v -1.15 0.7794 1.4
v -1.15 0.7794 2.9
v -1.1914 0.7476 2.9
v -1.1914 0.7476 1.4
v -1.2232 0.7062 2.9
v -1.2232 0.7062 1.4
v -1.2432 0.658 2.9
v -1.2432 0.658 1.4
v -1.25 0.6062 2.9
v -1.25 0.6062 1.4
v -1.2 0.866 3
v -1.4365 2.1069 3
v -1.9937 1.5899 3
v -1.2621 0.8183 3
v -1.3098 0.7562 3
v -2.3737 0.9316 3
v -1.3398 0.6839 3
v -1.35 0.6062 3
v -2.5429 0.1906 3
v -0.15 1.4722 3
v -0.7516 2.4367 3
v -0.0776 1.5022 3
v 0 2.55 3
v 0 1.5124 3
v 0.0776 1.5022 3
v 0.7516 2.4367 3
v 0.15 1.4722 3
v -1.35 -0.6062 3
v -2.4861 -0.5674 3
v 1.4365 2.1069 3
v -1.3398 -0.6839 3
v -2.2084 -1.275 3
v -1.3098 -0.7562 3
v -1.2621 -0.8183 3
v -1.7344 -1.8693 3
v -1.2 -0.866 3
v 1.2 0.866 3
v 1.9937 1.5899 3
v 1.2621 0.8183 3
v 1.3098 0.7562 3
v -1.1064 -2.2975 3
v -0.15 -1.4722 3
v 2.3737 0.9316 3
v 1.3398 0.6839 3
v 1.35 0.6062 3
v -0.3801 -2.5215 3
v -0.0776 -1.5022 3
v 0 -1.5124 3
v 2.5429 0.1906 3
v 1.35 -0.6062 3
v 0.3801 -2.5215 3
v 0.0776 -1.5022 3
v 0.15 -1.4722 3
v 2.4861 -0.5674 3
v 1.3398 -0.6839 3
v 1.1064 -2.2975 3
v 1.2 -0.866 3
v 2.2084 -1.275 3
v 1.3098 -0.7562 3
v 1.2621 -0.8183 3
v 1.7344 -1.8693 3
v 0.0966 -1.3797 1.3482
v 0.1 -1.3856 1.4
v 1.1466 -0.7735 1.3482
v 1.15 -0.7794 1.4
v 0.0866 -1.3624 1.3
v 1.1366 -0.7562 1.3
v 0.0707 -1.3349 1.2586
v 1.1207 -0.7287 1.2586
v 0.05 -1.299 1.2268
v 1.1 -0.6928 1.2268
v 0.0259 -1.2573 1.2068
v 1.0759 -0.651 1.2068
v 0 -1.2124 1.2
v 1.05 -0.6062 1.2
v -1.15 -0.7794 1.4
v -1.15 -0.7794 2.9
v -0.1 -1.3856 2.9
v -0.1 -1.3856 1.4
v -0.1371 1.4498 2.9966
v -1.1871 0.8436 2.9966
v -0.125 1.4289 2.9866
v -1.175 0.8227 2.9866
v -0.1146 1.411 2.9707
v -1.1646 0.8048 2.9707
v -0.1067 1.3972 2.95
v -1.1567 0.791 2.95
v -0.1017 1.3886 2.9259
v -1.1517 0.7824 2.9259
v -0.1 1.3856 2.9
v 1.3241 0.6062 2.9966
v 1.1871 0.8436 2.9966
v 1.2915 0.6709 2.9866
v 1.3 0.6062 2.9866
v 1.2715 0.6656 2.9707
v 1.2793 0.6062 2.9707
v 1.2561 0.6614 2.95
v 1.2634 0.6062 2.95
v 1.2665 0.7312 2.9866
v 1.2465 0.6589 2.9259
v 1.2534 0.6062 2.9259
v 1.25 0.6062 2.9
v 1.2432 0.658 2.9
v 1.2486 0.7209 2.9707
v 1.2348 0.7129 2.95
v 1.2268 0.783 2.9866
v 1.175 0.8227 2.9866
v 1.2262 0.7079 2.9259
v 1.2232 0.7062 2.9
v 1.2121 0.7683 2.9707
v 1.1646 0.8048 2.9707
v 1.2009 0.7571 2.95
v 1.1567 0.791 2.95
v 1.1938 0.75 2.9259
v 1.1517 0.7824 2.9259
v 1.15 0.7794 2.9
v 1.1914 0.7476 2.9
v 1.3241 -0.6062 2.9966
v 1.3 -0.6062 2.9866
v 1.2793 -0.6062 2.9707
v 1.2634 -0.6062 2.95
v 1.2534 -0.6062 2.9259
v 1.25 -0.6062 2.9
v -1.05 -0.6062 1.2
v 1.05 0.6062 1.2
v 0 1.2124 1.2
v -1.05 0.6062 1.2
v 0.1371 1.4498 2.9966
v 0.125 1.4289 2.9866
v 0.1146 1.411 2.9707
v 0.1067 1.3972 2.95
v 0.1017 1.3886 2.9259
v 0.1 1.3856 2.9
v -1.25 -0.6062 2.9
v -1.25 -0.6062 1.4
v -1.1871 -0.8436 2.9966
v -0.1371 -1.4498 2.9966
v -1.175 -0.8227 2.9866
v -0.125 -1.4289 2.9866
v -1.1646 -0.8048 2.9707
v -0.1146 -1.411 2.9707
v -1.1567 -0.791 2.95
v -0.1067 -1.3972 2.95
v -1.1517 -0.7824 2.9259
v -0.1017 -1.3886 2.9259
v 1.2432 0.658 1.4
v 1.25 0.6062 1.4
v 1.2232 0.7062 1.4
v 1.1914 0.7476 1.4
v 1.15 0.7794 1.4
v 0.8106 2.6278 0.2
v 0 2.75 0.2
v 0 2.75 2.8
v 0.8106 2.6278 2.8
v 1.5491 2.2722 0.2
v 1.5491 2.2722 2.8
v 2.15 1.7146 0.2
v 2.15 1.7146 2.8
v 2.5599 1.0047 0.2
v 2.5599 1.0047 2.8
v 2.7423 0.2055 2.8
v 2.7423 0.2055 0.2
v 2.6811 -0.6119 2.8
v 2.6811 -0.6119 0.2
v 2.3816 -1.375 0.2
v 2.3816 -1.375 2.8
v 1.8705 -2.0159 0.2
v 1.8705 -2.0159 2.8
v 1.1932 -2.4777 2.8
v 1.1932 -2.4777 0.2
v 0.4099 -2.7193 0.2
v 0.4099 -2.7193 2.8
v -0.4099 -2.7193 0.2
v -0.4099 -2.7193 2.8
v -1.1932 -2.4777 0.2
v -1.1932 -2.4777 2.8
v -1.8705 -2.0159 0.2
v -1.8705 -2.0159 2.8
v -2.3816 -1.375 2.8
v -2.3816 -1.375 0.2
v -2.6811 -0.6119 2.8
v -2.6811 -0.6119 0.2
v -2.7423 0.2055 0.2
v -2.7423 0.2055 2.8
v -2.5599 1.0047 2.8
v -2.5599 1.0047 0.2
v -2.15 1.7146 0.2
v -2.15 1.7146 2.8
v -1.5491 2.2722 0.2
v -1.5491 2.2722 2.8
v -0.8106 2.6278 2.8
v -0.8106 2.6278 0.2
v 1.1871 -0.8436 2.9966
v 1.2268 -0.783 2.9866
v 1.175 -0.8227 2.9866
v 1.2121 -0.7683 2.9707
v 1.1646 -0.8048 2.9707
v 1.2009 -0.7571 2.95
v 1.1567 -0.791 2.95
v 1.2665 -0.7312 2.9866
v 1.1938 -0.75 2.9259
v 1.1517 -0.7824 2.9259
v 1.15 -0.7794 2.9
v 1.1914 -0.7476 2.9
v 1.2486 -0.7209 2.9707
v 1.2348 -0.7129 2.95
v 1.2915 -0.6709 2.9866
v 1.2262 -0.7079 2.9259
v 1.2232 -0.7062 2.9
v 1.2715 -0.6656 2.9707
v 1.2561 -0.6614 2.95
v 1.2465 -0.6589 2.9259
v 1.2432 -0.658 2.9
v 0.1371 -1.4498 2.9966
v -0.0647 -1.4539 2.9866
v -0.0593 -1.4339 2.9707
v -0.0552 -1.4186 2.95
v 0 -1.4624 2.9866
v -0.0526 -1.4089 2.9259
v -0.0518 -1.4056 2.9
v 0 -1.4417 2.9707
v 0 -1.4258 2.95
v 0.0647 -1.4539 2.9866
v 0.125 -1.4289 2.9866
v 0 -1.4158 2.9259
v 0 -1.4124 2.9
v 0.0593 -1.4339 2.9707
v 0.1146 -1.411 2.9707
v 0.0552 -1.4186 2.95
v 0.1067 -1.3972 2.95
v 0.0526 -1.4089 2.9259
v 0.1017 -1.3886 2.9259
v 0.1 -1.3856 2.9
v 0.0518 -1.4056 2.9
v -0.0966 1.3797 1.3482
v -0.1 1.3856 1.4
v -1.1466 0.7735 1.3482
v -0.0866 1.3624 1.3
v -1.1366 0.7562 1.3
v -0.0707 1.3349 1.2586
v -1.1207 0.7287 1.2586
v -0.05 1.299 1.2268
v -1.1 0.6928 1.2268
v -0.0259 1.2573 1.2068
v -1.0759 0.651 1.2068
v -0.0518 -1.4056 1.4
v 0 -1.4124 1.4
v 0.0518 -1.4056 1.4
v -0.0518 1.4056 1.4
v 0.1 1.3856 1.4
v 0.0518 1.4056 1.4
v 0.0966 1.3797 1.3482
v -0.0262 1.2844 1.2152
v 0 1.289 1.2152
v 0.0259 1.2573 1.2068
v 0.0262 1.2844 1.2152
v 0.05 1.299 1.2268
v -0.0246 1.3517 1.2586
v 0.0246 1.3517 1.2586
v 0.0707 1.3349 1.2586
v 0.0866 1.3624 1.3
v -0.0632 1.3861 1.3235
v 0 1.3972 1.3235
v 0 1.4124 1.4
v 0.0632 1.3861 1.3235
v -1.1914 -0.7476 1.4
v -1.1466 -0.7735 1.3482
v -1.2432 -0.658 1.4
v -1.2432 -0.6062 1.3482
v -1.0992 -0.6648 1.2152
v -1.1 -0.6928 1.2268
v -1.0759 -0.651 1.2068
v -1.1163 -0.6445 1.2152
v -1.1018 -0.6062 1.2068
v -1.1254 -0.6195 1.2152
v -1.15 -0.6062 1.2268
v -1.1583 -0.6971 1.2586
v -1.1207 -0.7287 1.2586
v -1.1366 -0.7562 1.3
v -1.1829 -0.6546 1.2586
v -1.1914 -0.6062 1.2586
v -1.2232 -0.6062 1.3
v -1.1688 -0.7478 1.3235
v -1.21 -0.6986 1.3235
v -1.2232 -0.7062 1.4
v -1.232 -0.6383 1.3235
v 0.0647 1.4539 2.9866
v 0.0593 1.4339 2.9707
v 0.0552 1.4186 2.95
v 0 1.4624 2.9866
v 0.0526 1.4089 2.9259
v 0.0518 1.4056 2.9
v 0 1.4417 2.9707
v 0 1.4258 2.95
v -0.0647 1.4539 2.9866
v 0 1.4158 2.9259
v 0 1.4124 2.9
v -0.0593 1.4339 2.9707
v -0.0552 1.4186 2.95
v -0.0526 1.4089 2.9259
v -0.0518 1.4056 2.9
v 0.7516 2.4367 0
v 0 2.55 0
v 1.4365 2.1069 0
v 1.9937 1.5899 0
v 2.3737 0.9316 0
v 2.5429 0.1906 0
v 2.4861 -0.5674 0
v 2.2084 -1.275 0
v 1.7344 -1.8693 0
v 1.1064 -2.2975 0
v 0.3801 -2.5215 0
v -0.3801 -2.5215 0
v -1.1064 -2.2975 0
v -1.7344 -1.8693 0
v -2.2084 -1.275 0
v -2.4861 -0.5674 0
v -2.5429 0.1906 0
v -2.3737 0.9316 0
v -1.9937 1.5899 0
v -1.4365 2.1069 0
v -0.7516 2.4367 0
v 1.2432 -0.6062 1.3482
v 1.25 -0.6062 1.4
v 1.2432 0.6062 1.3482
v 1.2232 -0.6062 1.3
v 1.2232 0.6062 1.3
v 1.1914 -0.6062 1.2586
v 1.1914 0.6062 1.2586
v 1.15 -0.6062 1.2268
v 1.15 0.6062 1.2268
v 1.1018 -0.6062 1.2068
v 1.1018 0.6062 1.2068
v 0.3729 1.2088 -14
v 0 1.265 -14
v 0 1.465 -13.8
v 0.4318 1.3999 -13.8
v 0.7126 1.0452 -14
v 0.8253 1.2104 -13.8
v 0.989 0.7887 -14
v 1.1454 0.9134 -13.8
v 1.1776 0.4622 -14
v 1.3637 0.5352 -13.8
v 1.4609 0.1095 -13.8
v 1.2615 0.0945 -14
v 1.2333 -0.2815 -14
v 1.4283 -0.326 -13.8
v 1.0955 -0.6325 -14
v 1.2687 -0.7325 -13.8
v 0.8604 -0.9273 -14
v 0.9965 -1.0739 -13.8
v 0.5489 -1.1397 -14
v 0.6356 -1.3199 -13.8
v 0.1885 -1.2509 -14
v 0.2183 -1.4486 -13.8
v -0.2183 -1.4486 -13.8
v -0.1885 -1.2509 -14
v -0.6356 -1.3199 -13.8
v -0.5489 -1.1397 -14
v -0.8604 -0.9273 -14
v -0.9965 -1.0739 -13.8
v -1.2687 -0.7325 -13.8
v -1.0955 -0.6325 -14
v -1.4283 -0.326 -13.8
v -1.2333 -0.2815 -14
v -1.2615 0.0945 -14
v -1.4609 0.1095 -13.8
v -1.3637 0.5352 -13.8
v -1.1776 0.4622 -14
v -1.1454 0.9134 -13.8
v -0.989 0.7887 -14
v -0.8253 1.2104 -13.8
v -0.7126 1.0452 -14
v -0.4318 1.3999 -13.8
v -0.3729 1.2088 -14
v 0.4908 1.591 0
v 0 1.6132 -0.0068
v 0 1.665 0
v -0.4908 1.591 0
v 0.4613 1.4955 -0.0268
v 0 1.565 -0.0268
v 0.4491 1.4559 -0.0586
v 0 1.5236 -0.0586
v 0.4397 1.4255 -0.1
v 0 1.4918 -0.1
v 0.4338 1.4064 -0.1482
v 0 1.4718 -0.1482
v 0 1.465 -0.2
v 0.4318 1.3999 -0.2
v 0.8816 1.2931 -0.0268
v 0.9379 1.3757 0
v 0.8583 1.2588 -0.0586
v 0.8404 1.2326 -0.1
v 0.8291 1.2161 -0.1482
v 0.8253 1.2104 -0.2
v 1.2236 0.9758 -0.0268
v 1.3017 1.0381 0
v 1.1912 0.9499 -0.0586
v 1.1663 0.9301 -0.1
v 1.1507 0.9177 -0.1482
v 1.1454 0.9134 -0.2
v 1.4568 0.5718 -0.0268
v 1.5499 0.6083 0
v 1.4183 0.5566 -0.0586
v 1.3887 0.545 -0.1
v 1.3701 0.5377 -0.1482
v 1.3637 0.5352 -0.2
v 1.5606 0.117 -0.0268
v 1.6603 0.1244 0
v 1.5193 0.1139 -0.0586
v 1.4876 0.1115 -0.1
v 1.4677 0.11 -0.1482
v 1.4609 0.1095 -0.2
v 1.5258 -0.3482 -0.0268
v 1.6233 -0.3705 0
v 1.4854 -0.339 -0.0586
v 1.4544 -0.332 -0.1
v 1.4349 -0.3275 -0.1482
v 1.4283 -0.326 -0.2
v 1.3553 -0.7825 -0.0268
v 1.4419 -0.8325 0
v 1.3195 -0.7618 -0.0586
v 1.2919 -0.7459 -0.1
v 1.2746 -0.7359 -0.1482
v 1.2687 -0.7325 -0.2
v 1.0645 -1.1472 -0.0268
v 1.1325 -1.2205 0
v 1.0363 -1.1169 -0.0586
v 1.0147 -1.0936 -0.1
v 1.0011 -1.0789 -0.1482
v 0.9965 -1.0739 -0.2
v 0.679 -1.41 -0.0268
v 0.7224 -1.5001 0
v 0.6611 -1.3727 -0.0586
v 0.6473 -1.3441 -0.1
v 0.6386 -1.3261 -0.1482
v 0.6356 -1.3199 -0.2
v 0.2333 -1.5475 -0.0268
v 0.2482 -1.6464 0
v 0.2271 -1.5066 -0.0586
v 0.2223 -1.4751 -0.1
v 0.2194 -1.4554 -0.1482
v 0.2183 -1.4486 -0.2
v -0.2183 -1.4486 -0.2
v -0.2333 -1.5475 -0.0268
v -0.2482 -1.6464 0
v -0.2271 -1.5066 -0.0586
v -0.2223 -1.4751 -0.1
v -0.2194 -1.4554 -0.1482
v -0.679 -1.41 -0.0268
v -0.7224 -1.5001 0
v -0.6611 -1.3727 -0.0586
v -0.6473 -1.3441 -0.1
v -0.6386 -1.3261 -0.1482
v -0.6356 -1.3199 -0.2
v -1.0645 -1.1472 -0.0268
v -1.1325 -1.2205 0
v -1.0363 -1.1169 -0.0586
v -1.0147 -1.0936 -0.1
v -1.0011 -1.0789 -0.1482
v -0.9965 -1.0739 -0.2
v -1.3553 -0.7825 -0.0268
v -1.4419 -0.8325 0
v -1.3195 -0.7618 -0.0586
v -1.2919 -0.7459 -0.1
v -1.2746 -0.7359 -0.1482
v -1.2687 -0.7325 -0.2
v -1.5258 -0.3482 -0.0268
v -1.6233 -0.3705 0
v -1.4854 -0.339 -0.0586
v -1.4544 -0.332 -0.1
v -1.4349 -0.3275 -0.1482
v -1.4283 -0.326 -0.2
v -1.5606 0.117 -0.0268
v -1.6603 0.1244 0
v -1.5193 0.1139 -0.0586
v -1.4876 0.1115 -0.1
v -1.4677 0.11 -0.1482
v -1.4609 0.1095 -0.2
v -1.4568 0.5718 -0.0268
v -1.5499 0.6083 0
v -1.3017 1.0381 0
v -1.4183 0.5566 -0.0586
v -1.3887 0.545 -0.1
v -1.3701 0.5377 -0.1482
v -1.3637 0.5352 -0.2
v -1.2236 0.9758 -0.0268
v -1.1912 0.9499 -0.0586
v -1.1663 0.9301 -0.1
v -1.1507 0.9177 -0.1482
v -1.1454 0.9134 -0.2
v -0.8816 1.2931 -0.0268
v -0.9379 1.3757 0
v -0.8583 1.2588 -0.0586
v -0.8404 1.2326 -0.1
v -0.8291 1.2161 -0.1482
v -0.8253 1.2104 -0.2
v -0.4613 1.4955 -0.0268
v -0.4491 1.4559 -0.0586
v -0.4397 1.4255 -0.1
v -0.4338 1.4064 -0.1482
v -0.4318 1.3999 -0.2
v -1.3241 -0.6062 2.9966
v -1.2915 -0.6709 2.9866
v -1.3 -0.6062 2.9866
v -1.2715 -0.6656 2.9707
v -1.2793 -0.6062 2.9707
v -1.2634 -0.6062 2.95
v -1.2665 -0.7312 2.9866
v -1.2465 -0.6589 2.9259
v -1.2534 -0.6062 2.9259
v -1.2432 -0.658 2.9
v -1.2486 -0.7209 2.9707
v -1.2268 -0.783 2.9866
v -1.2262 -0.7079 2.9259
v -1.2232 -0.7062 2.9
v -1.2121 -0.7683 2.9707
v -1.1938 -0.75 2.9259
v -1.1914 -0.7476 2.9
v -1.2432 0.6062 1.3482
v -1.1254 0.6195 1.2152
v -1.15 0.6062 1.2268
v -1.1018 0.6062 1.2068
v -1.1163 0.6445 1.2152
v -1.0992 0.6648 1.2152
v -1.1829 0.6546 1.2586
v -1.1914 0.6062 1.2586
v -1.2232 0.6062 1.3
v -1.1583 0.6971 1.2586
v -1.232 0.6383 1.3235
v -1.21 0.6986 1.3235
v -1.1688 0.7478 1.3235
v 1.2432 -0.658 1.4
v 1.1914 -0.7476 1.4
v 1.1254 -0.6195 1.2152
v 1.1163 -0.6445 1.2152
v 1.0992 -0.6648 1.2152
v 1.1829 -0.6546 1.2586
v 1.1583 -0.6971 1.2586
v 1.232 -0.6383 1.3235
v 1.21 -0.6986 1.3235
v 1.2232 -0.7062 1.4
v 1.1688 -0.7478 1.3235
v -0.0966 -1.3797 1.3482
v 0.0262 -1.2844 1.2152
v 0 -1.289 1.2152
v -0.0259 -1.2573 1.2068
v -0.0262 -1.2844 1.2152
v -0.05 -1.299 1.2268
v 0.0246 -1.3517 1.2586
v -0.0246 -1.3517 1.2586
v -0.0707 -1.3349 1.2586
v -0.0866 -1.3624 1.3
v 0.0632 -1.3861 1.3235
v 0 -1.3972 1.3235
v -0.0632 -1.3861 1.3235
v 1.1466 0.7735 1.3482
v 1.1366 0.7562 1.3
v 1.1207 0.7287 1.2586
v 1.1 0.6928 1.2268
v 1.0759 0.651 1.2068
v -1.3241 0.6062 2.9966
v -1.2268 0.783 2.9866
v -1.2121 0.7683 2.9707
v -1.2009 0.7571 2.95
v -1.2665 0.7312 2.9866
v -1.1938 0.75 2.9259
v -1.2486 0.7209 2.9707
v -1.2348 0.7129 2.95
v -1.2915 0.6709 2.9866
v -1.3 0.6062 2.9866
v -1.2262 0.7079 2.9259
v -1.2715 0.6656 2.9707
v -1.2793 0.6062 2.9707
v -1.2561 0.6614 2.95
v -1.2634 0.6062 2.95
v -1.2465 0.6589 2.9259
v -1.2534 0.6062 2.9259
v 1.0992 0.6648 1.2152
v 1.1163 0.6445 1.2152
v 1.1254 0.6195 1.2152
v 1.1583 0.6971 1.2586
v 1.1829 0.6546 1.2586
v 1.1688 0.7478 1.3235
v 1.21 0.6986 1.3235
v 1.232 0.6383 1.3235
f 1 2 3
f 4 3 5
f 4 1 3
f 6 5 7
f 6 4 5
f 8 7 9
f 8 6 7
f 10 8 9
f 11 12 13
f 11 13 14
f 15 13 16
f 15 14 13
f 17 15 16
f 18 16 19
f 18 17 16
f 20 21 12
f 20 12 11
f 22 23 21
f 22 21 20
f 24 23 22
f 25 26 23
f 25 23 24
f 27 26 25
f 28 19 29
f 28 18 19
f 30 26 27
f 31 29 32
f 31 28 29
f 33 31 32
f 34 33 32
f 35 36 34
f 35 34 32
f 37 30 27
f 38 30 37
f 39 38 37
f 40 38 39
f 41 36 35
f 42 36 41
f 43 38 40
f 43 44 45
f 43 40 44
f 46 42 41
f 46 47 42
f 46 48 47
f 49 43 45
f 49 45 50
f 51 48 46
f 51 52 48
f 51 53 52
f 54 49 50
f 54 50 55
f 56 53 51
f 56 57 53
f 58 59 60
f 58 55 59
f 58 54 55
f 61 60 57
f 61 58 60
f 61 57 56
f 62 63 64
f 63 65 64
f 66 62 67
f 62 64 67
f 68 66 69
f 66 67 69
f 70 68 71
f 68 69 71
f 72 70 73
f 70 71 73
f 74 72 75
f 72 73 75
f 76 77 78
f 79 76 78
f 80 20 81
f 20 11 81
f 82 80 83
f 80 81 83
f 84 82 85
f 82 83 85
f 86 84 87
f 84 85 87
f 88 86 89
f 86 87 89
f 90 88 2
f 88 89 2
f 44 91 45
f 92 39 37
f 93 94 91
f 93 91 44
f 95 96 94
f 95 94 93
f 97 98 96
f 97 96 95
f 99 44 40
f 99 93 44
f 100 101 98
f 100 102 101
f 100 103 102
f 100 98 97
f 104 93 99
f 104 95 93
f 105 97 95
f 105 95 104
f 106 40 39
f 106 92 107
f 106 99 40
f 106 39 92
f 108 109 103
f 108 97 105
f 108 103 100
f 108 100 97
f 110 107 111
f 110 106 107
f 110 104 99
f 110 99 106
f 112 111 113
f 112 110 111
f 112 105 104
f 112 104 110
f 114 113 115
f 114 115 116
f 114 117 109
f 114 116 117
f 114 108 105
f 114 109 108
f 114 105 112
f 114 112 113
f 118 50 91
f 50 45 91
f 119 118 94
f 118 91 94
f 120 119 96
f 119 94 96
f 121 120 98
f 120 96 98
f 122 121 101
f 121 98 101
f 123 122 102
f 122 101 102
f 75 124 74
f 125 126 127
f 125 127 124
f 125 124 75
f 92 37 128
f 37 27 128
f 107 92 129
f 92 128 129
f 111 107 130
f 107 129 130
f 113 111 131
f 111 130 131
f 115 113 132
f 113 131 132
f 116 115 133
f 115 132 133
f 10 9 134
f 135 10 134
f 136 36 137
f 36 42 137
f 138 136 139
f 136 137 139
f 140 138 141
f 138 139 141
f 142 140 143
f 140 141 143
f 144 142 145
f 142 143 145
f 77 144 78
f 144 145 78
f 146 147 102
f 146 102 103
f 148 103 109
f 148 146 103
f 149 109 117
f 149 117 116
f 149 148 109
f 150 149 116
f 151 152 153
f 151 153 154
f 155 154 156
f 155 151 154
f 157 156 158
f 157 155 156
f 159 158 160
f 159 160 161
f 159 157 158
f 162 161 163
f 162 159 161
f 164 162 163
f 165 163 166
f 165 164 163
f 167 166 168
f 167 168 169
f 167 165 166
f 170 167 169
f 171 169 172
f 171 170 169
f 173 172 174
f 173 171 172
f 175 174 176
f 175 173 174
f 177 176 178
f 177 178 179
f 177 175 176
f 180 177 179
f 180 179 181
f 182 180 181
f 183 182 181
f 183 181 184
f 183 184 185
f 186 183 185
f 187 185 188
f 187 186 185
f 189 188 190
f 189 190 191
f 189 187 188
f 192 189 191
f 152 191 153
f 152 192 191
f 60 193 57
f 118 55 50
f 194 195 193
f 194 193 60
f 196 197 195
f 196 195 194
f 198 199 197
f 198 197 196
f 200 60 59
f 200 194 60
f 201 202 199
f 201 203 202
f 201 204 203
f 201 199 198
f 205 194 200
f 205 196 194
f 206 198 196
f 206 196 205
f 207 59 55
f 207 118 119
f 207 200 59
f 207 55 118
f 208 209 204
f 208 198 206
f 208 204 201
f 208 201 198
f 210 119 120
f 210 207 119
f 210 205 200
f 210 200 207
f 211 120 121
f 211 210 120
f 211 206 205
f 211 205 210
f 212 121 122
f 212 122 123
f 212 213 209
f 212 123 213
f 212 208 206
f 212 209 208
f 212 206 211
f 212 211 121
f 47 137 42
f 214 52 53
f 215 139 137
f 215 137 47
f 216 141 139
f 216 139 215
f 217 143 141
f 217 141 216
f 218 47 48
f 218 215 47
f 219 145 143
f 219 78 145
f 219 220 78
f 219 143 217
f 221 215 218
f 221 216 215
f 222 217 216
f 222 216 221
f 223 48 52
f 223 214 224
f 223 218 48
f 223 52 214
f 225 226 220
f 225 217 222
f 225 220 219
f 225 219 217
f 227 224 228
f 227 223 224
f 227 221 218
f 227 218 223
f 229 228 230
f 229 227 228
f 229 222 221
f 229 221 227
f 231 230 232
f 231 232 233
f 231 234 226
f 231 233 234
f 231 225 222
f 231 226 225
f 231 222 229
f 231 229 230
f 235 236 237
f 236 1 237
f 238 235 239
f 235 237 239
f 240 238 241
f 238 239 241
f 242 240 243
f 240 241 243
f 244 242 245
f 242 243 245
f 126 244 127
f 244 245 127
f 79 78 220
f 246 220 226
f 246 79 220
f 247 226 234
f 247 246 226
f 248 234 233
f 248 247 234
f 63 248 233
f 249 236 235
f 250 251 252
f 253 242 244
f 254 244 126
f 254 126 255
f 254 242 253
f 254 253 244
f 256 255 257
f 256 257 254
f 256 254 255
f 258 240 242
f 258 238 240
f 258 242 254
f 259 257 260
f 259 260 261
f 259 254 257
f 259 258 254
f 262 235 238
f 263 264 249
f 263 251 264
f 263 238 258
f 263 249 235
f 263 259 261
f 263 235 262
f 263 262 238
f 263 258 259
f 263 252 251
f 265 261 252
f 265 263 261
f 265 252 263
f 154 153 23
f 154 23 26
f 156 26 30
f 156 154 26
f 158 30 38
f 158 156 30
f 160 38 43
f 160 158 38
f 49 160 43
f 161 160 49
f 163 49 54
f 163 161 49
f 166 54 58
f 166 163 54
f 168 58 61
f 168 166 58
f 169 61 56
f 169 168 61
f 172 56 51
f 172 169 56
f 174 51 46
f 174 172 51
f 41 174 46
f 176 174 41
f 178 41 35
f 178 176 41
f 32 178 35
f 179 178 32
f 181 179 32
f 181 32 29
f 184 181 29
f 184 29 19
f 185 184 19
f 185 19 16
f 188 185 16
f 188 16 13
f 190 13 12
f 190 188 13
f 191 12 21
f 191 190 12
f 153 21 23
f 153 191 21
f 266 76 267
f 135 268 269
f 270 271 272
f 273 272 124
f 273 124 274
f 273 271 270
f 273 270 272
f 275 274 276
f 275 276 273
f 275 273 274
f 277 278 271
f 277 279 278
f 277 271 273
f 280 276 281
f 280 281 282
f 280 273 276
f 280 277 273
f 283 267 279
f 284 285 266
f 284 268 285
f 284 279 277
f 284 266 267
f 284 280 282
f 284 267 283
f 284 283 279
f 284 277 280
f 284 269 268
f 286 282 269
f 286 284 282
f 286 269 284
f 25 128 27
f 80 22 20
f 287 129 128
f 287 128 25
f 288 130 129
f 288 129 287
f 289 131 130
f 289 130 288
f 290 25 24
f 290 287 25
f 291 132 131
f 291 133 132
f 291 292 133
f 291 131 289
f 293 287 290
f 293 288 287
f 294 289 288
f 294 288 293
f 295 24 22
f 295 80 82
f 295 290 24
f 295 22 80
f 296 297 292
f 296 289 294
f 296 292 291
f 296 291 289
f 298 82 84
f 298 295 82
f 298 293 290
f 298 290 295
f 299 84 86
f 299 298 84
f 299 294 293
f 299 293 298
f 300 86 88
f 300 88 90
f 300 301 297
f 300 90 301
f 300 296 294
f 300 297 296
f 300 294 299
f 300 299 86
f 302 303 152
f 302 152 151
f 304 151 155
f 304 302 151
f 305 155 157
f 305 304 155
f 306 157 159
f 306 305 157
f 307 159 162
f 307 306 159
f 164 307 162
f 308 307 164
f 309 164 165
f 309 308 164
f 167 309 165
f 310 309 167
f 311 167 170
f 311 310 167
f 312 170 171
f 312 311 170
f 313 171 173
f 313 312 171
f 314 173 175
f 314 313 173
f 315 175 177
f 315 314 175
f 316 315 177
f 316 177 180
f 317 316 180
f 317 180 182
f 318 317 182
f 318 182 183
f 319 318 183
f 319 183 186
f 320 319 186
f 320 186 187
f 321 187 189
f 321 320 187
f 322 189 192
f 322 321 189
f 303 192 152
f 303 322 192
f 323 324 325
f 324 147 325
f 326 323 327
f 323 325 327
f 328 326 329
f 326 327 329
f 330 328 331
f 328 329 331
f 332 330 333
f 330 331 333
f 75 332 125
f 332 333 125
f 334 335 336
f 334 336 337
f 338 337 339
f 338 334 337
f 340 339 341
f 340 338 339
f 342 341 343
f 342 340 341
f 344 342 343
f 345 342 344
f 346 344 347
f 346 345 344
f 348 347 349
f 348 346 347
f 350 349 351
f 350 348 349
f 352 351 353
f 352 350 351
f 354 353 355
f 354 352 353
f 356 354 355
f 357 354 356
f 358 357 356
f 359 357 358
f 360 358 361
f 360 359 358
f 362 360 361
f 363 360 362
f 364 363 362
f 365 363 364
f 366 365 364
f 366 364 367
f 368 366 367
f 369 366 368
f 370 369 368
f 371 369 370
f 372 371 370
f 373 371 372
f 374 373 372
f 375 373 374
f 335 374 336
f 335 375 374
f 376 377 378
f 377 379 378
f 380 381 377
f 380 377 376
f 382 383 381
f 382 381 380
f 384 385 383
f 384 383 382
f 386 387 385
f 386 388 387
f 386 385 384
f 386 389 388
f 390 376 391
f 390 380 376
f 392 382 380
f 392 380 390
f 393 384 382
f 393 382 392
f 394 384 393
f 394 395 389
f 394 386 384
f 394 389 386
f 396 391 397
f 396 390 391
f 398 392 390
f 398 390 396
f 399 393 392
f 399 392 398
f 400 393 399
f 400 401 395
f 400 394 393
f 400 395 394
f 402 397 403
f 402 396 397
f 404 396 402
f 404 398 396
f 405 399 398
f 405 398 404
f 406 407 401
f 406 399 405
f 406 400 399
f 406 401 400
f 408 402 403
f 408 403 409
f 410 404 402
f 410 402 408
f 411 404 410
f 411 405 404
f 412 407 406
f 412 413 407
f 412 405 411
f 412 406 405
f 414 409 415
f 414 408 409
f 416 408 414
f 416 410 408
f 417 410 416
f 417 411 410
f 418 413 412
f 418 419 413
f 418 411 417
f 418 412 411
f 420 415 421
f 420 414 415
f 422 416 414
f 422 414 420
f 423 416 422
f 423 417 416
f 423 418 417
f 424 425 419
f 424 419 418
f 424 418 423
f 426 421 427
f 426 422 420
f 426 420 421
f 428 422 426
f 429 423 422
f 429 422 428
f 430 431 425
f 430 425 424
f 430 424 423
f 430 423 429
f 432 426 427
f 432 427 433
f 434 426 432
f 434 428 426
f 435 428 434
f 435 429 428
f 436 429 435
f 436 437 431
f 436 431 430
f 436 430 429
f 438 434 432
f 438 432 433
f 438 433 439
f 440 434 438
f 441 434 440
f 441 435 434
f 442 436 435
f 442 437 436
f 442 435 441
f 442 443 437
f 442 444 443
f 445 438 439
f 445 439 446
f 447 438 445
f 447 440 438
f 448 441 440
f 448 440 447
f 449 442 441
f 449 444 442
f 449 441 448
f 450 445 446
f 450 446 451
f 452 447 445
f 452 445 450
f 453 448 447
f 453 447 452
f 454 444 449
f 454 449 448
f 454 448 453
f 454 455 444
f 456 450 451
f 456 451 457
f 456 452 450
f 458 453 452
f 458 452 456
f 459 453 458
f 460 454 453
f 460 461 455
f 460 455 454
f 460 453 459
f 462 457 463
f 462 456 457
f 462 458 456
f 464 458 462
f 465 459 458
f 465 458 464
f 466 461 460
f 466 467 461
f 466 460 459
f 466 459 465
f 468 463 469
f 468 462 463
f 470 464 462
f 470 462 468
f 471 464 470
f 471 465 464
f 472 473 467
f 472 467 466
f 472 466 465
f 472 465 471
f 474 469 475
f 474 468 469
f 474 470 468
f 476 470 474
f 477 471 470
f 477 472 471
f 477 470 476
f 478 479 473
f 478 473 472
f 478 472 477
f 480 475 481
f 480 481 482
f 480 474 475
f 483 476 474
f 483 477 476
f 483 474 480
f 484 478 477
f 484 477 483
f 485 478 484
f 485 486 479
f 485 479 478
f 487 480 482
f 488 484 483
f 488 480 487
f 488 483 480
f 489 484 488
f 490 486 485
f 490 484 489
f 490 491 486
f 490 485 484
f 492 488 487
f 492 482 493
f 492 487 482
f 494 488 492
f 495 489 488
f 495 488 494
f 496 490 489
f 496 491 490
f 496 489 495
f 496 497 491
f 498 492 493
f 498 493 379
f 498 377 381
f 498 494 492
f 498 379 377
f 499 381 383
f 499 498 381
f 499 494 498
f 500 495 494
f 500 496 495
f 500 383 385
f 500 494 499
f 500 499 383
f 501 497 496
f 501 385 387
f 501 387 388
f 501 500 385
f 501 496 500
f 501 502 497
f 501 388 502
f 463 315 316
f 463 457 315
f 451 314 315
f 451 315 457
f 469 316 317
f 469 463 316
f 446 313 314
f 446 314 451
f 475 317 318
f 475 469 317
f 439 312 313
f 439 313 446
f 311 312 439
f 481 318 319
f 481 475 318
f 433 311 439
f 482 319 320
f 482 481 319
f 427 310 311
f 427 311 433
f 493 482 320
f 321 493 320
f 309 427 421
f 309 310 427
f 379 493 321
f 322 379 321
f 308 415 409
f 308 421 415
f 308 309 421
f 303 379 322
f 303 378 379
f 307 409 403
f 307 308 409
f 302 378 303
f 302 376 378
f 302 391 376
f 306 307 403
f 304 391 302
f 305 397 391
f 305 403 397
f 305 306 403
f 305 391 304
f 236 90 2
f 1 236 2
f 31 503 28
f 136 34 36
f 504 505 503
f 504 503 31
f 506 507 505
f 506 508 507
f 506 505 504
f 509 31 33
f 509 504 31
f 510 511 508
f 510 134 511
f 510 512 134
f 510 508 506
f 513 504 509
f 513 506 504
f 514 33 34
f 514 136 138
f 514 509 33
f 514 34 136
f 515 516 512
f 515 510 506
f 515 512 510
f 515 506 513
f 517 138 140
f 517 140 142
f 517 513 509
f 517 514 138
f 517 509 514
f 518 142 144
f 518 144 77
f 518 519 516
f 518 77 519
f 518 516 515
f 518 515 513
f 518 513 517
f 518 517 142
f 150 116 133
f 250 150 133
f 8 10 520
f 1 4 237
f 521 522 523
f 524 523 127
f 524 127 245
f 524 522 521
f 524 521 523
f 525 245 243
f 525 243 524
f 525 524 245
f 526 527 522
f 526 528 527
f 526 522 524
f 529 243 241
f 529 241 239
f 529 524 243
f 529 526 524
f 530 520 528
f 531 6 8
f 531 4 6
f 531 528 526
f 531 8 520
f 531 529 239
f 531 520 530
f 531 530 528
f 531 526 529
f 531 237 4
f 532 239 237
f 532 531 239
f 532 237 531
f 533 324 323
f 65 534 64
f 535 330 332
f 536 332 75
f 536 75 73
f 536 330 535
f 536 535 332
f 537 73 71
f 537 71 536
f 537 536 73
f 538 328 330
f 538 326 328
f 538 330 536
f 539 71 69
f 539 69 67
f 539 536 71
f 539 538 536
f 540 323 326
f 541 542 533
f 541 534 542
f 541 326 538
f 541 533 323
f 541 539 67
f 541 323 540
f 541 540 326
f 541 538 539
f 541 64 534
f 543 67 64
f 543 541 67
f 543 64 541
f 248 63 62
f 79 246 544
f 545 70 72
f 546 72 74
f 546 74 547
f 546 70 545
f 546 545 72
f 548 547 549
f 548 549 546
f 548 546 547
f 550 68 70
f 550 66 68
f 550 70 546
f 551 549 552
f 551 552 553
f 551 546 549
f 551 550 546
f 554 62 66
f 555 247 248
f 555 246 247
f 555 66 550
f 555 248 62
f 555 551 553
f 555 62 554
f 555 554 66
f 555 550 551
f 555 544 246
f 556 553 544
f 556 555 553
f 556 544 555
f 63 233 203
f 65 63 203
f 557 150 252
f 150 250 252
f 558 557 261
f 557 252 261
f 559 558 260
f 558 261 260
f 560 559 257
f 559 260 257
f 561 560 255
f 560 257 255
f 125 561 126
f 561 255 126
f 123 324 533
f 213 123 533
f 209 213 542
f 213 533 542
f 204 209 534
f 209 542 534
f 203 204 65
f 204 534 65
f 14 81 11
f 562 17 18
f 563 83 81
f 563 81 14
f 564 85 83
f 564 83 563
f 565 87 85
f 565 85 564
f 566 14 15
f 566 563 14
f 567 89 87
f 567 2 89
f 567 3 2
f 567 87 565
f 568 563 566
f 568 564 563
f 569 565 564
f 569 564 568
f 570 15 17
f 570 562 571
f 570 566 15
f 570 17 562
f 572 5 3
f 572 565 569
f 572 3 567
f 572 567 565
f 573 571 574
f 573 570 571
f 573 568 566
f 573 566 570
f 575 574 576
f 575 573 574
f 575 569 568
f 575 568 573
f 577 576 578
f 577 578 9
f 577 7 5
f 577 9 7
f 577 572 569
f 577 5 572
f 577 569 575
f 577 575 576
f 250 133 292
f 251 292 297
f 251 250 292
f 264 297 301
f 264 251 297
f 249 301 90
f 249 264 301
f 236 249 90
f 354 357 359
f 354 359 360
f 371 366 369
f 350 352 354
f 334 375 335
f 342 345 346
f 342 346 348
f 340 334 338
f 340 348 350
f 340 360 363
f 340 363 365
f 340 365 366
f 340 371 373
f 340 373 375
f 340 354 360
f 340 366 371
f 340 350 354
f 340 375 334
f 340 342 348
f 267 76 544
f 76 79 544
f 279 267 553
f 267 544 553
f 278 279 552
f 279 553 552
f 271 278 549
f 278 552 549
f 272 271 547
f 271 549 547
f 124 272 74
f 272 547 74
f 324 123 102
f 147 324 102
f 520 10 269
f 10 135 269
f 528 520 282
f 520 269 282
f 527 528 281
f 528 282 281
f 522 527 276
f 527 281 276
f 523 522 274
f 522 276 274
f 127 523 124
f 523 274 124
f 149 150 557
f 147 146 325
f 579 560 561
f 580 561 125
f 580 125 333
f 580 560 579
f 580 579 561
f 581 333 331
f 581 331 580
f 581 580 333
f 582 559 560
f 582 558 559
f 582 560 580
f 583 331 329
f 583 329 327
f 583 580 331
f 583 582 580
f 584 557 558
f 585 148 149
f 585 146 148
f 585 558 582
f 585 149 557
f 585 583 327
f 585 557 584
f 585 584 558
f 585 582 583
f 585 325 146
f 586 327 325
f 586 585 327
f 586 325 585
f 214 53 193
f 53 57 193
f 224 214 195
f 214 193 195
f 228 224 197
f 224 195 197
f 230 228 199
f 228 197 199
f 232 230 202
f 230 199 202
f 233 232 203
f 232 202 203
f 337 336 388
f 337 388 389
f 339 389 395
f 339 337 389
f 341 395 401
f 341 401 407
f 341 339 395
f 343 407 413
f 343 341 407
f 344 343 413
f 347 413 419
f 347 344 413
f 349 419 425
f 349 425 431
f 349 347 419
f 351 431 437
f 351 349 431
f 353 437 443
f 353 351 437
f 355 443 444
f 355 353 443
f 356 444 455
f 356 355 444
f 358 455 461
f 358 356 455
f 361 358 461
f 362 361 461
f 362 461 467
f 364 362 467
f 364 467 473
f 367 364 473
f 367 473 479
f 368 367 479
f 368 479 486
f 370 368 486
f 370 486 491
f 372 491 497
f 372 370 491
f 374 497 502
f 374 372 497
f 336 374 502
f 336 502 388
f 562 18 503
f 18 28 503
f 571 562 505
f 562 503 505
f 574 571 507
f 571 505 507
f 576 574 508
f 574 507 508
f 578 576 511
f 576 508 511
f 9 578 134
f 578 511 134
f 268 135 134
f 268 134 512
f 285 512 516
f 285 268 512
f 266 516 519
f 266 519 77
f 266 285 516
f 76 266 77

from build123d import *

# Parameters (mm, degrees)
SCHNITT_LINEAR_AUSTRAGEN1_DEPTH = 1.8
FASE1_SIZE                      = 0.2
VERRUNDUNG1_R                   = 0.2
VERRUNDUNG2_R                   = 0.1


with BuildPart() as part:
    # Skizze1 → Rotation1 (revolve)
    with BuildSketch(Plane(origin=(0, 0, 0), x_dir=(0, 0, -1), z_dir=(1, 0, 0))):
        Polygon((-3, 0), (-3, 2.75), (0, 2.75), (0, 1.465), (14, 1.465), (14, 0), align=None)
    revolve(axis=Axis((0, 0, 21.919879518), (0, 0, -1)))

    # Skizze2 → Schnitt-Linear austragen1 (cut)
    with BuildSketch(Plane.XY.offset(3)):
        Polygon((1.25, -0.721687836), (1.25, 0.721687836), (0, 1.443375673), (-1.25, 0.721687836), (-1.25, -0.721687836), (0, -1.443375673), align=None)
    extrude(amount=-SCHNITT_LINEAR_AUSTRAGEN1_DEPTH, mode=Mode.SUBTRACT)

    # Fase1
    fase1_edges = [part.edges().sort_by_distance(p)[0] for p in [
        (0, -1.465, -14),
        (0, -2.75, 0),
        (0, -2.75, 3),
    ]]
    chamfer(fase1_edges, length=FASE1_SIZE)

    # Verrundung1
    verrundung1_edges = [part.edges().sort_by_distance(p)[0] for p in [
        (0.625, -1.082531755, 1.2),
        (1.25, -0.721687836, 2.1),
        (-0.625, -1.082531755, 1.2),
        (0, -1.443375673, 2.1),
        (-1.25, 0, 1.2),
        (-1.25, -0.721687836, 2.1),
        (-0.625, 1.082531755, 1.2),
        (-1.25, 0.721687836, 2.1),
        (0.625, 1.082531755, 1.2),
        (0, 1.443375673, 2.1),
        (1.25, 0, 1.2),
        (1.25, 0.721687836, 2.1),
        (0, -1.465, 0),
    ]]
    fillet(verrundung1_edges, radius=VERRUNDUNG1_R)

    # Verrundung2
    verrundung2_edges = [part.edges().sort_by_distance(p)[0] for p in [
        (-0.625, -1.082531755, 3),
        (-1.25, 0, 3),
        (-0.625, 1.082531755, 3),
        (0.625, 1.082531755, 3),
        (1.25, 0, 3),
        (0.625, -1.082531755, 3),
        (-1.223205081, -0.706217783, 3),
        (0, -1.412435565, 3),
        (1.223205081, -0.706217783, 3),
        (1.223205081, 0.706217783, 3),
        (0, 1.412435565, 3),
        (-1.223205081, 0.706217783, 3),
    ]]
    fillet(verrundung2_edges, radius=VERRUNDUNG2_R)


solid = part.part
